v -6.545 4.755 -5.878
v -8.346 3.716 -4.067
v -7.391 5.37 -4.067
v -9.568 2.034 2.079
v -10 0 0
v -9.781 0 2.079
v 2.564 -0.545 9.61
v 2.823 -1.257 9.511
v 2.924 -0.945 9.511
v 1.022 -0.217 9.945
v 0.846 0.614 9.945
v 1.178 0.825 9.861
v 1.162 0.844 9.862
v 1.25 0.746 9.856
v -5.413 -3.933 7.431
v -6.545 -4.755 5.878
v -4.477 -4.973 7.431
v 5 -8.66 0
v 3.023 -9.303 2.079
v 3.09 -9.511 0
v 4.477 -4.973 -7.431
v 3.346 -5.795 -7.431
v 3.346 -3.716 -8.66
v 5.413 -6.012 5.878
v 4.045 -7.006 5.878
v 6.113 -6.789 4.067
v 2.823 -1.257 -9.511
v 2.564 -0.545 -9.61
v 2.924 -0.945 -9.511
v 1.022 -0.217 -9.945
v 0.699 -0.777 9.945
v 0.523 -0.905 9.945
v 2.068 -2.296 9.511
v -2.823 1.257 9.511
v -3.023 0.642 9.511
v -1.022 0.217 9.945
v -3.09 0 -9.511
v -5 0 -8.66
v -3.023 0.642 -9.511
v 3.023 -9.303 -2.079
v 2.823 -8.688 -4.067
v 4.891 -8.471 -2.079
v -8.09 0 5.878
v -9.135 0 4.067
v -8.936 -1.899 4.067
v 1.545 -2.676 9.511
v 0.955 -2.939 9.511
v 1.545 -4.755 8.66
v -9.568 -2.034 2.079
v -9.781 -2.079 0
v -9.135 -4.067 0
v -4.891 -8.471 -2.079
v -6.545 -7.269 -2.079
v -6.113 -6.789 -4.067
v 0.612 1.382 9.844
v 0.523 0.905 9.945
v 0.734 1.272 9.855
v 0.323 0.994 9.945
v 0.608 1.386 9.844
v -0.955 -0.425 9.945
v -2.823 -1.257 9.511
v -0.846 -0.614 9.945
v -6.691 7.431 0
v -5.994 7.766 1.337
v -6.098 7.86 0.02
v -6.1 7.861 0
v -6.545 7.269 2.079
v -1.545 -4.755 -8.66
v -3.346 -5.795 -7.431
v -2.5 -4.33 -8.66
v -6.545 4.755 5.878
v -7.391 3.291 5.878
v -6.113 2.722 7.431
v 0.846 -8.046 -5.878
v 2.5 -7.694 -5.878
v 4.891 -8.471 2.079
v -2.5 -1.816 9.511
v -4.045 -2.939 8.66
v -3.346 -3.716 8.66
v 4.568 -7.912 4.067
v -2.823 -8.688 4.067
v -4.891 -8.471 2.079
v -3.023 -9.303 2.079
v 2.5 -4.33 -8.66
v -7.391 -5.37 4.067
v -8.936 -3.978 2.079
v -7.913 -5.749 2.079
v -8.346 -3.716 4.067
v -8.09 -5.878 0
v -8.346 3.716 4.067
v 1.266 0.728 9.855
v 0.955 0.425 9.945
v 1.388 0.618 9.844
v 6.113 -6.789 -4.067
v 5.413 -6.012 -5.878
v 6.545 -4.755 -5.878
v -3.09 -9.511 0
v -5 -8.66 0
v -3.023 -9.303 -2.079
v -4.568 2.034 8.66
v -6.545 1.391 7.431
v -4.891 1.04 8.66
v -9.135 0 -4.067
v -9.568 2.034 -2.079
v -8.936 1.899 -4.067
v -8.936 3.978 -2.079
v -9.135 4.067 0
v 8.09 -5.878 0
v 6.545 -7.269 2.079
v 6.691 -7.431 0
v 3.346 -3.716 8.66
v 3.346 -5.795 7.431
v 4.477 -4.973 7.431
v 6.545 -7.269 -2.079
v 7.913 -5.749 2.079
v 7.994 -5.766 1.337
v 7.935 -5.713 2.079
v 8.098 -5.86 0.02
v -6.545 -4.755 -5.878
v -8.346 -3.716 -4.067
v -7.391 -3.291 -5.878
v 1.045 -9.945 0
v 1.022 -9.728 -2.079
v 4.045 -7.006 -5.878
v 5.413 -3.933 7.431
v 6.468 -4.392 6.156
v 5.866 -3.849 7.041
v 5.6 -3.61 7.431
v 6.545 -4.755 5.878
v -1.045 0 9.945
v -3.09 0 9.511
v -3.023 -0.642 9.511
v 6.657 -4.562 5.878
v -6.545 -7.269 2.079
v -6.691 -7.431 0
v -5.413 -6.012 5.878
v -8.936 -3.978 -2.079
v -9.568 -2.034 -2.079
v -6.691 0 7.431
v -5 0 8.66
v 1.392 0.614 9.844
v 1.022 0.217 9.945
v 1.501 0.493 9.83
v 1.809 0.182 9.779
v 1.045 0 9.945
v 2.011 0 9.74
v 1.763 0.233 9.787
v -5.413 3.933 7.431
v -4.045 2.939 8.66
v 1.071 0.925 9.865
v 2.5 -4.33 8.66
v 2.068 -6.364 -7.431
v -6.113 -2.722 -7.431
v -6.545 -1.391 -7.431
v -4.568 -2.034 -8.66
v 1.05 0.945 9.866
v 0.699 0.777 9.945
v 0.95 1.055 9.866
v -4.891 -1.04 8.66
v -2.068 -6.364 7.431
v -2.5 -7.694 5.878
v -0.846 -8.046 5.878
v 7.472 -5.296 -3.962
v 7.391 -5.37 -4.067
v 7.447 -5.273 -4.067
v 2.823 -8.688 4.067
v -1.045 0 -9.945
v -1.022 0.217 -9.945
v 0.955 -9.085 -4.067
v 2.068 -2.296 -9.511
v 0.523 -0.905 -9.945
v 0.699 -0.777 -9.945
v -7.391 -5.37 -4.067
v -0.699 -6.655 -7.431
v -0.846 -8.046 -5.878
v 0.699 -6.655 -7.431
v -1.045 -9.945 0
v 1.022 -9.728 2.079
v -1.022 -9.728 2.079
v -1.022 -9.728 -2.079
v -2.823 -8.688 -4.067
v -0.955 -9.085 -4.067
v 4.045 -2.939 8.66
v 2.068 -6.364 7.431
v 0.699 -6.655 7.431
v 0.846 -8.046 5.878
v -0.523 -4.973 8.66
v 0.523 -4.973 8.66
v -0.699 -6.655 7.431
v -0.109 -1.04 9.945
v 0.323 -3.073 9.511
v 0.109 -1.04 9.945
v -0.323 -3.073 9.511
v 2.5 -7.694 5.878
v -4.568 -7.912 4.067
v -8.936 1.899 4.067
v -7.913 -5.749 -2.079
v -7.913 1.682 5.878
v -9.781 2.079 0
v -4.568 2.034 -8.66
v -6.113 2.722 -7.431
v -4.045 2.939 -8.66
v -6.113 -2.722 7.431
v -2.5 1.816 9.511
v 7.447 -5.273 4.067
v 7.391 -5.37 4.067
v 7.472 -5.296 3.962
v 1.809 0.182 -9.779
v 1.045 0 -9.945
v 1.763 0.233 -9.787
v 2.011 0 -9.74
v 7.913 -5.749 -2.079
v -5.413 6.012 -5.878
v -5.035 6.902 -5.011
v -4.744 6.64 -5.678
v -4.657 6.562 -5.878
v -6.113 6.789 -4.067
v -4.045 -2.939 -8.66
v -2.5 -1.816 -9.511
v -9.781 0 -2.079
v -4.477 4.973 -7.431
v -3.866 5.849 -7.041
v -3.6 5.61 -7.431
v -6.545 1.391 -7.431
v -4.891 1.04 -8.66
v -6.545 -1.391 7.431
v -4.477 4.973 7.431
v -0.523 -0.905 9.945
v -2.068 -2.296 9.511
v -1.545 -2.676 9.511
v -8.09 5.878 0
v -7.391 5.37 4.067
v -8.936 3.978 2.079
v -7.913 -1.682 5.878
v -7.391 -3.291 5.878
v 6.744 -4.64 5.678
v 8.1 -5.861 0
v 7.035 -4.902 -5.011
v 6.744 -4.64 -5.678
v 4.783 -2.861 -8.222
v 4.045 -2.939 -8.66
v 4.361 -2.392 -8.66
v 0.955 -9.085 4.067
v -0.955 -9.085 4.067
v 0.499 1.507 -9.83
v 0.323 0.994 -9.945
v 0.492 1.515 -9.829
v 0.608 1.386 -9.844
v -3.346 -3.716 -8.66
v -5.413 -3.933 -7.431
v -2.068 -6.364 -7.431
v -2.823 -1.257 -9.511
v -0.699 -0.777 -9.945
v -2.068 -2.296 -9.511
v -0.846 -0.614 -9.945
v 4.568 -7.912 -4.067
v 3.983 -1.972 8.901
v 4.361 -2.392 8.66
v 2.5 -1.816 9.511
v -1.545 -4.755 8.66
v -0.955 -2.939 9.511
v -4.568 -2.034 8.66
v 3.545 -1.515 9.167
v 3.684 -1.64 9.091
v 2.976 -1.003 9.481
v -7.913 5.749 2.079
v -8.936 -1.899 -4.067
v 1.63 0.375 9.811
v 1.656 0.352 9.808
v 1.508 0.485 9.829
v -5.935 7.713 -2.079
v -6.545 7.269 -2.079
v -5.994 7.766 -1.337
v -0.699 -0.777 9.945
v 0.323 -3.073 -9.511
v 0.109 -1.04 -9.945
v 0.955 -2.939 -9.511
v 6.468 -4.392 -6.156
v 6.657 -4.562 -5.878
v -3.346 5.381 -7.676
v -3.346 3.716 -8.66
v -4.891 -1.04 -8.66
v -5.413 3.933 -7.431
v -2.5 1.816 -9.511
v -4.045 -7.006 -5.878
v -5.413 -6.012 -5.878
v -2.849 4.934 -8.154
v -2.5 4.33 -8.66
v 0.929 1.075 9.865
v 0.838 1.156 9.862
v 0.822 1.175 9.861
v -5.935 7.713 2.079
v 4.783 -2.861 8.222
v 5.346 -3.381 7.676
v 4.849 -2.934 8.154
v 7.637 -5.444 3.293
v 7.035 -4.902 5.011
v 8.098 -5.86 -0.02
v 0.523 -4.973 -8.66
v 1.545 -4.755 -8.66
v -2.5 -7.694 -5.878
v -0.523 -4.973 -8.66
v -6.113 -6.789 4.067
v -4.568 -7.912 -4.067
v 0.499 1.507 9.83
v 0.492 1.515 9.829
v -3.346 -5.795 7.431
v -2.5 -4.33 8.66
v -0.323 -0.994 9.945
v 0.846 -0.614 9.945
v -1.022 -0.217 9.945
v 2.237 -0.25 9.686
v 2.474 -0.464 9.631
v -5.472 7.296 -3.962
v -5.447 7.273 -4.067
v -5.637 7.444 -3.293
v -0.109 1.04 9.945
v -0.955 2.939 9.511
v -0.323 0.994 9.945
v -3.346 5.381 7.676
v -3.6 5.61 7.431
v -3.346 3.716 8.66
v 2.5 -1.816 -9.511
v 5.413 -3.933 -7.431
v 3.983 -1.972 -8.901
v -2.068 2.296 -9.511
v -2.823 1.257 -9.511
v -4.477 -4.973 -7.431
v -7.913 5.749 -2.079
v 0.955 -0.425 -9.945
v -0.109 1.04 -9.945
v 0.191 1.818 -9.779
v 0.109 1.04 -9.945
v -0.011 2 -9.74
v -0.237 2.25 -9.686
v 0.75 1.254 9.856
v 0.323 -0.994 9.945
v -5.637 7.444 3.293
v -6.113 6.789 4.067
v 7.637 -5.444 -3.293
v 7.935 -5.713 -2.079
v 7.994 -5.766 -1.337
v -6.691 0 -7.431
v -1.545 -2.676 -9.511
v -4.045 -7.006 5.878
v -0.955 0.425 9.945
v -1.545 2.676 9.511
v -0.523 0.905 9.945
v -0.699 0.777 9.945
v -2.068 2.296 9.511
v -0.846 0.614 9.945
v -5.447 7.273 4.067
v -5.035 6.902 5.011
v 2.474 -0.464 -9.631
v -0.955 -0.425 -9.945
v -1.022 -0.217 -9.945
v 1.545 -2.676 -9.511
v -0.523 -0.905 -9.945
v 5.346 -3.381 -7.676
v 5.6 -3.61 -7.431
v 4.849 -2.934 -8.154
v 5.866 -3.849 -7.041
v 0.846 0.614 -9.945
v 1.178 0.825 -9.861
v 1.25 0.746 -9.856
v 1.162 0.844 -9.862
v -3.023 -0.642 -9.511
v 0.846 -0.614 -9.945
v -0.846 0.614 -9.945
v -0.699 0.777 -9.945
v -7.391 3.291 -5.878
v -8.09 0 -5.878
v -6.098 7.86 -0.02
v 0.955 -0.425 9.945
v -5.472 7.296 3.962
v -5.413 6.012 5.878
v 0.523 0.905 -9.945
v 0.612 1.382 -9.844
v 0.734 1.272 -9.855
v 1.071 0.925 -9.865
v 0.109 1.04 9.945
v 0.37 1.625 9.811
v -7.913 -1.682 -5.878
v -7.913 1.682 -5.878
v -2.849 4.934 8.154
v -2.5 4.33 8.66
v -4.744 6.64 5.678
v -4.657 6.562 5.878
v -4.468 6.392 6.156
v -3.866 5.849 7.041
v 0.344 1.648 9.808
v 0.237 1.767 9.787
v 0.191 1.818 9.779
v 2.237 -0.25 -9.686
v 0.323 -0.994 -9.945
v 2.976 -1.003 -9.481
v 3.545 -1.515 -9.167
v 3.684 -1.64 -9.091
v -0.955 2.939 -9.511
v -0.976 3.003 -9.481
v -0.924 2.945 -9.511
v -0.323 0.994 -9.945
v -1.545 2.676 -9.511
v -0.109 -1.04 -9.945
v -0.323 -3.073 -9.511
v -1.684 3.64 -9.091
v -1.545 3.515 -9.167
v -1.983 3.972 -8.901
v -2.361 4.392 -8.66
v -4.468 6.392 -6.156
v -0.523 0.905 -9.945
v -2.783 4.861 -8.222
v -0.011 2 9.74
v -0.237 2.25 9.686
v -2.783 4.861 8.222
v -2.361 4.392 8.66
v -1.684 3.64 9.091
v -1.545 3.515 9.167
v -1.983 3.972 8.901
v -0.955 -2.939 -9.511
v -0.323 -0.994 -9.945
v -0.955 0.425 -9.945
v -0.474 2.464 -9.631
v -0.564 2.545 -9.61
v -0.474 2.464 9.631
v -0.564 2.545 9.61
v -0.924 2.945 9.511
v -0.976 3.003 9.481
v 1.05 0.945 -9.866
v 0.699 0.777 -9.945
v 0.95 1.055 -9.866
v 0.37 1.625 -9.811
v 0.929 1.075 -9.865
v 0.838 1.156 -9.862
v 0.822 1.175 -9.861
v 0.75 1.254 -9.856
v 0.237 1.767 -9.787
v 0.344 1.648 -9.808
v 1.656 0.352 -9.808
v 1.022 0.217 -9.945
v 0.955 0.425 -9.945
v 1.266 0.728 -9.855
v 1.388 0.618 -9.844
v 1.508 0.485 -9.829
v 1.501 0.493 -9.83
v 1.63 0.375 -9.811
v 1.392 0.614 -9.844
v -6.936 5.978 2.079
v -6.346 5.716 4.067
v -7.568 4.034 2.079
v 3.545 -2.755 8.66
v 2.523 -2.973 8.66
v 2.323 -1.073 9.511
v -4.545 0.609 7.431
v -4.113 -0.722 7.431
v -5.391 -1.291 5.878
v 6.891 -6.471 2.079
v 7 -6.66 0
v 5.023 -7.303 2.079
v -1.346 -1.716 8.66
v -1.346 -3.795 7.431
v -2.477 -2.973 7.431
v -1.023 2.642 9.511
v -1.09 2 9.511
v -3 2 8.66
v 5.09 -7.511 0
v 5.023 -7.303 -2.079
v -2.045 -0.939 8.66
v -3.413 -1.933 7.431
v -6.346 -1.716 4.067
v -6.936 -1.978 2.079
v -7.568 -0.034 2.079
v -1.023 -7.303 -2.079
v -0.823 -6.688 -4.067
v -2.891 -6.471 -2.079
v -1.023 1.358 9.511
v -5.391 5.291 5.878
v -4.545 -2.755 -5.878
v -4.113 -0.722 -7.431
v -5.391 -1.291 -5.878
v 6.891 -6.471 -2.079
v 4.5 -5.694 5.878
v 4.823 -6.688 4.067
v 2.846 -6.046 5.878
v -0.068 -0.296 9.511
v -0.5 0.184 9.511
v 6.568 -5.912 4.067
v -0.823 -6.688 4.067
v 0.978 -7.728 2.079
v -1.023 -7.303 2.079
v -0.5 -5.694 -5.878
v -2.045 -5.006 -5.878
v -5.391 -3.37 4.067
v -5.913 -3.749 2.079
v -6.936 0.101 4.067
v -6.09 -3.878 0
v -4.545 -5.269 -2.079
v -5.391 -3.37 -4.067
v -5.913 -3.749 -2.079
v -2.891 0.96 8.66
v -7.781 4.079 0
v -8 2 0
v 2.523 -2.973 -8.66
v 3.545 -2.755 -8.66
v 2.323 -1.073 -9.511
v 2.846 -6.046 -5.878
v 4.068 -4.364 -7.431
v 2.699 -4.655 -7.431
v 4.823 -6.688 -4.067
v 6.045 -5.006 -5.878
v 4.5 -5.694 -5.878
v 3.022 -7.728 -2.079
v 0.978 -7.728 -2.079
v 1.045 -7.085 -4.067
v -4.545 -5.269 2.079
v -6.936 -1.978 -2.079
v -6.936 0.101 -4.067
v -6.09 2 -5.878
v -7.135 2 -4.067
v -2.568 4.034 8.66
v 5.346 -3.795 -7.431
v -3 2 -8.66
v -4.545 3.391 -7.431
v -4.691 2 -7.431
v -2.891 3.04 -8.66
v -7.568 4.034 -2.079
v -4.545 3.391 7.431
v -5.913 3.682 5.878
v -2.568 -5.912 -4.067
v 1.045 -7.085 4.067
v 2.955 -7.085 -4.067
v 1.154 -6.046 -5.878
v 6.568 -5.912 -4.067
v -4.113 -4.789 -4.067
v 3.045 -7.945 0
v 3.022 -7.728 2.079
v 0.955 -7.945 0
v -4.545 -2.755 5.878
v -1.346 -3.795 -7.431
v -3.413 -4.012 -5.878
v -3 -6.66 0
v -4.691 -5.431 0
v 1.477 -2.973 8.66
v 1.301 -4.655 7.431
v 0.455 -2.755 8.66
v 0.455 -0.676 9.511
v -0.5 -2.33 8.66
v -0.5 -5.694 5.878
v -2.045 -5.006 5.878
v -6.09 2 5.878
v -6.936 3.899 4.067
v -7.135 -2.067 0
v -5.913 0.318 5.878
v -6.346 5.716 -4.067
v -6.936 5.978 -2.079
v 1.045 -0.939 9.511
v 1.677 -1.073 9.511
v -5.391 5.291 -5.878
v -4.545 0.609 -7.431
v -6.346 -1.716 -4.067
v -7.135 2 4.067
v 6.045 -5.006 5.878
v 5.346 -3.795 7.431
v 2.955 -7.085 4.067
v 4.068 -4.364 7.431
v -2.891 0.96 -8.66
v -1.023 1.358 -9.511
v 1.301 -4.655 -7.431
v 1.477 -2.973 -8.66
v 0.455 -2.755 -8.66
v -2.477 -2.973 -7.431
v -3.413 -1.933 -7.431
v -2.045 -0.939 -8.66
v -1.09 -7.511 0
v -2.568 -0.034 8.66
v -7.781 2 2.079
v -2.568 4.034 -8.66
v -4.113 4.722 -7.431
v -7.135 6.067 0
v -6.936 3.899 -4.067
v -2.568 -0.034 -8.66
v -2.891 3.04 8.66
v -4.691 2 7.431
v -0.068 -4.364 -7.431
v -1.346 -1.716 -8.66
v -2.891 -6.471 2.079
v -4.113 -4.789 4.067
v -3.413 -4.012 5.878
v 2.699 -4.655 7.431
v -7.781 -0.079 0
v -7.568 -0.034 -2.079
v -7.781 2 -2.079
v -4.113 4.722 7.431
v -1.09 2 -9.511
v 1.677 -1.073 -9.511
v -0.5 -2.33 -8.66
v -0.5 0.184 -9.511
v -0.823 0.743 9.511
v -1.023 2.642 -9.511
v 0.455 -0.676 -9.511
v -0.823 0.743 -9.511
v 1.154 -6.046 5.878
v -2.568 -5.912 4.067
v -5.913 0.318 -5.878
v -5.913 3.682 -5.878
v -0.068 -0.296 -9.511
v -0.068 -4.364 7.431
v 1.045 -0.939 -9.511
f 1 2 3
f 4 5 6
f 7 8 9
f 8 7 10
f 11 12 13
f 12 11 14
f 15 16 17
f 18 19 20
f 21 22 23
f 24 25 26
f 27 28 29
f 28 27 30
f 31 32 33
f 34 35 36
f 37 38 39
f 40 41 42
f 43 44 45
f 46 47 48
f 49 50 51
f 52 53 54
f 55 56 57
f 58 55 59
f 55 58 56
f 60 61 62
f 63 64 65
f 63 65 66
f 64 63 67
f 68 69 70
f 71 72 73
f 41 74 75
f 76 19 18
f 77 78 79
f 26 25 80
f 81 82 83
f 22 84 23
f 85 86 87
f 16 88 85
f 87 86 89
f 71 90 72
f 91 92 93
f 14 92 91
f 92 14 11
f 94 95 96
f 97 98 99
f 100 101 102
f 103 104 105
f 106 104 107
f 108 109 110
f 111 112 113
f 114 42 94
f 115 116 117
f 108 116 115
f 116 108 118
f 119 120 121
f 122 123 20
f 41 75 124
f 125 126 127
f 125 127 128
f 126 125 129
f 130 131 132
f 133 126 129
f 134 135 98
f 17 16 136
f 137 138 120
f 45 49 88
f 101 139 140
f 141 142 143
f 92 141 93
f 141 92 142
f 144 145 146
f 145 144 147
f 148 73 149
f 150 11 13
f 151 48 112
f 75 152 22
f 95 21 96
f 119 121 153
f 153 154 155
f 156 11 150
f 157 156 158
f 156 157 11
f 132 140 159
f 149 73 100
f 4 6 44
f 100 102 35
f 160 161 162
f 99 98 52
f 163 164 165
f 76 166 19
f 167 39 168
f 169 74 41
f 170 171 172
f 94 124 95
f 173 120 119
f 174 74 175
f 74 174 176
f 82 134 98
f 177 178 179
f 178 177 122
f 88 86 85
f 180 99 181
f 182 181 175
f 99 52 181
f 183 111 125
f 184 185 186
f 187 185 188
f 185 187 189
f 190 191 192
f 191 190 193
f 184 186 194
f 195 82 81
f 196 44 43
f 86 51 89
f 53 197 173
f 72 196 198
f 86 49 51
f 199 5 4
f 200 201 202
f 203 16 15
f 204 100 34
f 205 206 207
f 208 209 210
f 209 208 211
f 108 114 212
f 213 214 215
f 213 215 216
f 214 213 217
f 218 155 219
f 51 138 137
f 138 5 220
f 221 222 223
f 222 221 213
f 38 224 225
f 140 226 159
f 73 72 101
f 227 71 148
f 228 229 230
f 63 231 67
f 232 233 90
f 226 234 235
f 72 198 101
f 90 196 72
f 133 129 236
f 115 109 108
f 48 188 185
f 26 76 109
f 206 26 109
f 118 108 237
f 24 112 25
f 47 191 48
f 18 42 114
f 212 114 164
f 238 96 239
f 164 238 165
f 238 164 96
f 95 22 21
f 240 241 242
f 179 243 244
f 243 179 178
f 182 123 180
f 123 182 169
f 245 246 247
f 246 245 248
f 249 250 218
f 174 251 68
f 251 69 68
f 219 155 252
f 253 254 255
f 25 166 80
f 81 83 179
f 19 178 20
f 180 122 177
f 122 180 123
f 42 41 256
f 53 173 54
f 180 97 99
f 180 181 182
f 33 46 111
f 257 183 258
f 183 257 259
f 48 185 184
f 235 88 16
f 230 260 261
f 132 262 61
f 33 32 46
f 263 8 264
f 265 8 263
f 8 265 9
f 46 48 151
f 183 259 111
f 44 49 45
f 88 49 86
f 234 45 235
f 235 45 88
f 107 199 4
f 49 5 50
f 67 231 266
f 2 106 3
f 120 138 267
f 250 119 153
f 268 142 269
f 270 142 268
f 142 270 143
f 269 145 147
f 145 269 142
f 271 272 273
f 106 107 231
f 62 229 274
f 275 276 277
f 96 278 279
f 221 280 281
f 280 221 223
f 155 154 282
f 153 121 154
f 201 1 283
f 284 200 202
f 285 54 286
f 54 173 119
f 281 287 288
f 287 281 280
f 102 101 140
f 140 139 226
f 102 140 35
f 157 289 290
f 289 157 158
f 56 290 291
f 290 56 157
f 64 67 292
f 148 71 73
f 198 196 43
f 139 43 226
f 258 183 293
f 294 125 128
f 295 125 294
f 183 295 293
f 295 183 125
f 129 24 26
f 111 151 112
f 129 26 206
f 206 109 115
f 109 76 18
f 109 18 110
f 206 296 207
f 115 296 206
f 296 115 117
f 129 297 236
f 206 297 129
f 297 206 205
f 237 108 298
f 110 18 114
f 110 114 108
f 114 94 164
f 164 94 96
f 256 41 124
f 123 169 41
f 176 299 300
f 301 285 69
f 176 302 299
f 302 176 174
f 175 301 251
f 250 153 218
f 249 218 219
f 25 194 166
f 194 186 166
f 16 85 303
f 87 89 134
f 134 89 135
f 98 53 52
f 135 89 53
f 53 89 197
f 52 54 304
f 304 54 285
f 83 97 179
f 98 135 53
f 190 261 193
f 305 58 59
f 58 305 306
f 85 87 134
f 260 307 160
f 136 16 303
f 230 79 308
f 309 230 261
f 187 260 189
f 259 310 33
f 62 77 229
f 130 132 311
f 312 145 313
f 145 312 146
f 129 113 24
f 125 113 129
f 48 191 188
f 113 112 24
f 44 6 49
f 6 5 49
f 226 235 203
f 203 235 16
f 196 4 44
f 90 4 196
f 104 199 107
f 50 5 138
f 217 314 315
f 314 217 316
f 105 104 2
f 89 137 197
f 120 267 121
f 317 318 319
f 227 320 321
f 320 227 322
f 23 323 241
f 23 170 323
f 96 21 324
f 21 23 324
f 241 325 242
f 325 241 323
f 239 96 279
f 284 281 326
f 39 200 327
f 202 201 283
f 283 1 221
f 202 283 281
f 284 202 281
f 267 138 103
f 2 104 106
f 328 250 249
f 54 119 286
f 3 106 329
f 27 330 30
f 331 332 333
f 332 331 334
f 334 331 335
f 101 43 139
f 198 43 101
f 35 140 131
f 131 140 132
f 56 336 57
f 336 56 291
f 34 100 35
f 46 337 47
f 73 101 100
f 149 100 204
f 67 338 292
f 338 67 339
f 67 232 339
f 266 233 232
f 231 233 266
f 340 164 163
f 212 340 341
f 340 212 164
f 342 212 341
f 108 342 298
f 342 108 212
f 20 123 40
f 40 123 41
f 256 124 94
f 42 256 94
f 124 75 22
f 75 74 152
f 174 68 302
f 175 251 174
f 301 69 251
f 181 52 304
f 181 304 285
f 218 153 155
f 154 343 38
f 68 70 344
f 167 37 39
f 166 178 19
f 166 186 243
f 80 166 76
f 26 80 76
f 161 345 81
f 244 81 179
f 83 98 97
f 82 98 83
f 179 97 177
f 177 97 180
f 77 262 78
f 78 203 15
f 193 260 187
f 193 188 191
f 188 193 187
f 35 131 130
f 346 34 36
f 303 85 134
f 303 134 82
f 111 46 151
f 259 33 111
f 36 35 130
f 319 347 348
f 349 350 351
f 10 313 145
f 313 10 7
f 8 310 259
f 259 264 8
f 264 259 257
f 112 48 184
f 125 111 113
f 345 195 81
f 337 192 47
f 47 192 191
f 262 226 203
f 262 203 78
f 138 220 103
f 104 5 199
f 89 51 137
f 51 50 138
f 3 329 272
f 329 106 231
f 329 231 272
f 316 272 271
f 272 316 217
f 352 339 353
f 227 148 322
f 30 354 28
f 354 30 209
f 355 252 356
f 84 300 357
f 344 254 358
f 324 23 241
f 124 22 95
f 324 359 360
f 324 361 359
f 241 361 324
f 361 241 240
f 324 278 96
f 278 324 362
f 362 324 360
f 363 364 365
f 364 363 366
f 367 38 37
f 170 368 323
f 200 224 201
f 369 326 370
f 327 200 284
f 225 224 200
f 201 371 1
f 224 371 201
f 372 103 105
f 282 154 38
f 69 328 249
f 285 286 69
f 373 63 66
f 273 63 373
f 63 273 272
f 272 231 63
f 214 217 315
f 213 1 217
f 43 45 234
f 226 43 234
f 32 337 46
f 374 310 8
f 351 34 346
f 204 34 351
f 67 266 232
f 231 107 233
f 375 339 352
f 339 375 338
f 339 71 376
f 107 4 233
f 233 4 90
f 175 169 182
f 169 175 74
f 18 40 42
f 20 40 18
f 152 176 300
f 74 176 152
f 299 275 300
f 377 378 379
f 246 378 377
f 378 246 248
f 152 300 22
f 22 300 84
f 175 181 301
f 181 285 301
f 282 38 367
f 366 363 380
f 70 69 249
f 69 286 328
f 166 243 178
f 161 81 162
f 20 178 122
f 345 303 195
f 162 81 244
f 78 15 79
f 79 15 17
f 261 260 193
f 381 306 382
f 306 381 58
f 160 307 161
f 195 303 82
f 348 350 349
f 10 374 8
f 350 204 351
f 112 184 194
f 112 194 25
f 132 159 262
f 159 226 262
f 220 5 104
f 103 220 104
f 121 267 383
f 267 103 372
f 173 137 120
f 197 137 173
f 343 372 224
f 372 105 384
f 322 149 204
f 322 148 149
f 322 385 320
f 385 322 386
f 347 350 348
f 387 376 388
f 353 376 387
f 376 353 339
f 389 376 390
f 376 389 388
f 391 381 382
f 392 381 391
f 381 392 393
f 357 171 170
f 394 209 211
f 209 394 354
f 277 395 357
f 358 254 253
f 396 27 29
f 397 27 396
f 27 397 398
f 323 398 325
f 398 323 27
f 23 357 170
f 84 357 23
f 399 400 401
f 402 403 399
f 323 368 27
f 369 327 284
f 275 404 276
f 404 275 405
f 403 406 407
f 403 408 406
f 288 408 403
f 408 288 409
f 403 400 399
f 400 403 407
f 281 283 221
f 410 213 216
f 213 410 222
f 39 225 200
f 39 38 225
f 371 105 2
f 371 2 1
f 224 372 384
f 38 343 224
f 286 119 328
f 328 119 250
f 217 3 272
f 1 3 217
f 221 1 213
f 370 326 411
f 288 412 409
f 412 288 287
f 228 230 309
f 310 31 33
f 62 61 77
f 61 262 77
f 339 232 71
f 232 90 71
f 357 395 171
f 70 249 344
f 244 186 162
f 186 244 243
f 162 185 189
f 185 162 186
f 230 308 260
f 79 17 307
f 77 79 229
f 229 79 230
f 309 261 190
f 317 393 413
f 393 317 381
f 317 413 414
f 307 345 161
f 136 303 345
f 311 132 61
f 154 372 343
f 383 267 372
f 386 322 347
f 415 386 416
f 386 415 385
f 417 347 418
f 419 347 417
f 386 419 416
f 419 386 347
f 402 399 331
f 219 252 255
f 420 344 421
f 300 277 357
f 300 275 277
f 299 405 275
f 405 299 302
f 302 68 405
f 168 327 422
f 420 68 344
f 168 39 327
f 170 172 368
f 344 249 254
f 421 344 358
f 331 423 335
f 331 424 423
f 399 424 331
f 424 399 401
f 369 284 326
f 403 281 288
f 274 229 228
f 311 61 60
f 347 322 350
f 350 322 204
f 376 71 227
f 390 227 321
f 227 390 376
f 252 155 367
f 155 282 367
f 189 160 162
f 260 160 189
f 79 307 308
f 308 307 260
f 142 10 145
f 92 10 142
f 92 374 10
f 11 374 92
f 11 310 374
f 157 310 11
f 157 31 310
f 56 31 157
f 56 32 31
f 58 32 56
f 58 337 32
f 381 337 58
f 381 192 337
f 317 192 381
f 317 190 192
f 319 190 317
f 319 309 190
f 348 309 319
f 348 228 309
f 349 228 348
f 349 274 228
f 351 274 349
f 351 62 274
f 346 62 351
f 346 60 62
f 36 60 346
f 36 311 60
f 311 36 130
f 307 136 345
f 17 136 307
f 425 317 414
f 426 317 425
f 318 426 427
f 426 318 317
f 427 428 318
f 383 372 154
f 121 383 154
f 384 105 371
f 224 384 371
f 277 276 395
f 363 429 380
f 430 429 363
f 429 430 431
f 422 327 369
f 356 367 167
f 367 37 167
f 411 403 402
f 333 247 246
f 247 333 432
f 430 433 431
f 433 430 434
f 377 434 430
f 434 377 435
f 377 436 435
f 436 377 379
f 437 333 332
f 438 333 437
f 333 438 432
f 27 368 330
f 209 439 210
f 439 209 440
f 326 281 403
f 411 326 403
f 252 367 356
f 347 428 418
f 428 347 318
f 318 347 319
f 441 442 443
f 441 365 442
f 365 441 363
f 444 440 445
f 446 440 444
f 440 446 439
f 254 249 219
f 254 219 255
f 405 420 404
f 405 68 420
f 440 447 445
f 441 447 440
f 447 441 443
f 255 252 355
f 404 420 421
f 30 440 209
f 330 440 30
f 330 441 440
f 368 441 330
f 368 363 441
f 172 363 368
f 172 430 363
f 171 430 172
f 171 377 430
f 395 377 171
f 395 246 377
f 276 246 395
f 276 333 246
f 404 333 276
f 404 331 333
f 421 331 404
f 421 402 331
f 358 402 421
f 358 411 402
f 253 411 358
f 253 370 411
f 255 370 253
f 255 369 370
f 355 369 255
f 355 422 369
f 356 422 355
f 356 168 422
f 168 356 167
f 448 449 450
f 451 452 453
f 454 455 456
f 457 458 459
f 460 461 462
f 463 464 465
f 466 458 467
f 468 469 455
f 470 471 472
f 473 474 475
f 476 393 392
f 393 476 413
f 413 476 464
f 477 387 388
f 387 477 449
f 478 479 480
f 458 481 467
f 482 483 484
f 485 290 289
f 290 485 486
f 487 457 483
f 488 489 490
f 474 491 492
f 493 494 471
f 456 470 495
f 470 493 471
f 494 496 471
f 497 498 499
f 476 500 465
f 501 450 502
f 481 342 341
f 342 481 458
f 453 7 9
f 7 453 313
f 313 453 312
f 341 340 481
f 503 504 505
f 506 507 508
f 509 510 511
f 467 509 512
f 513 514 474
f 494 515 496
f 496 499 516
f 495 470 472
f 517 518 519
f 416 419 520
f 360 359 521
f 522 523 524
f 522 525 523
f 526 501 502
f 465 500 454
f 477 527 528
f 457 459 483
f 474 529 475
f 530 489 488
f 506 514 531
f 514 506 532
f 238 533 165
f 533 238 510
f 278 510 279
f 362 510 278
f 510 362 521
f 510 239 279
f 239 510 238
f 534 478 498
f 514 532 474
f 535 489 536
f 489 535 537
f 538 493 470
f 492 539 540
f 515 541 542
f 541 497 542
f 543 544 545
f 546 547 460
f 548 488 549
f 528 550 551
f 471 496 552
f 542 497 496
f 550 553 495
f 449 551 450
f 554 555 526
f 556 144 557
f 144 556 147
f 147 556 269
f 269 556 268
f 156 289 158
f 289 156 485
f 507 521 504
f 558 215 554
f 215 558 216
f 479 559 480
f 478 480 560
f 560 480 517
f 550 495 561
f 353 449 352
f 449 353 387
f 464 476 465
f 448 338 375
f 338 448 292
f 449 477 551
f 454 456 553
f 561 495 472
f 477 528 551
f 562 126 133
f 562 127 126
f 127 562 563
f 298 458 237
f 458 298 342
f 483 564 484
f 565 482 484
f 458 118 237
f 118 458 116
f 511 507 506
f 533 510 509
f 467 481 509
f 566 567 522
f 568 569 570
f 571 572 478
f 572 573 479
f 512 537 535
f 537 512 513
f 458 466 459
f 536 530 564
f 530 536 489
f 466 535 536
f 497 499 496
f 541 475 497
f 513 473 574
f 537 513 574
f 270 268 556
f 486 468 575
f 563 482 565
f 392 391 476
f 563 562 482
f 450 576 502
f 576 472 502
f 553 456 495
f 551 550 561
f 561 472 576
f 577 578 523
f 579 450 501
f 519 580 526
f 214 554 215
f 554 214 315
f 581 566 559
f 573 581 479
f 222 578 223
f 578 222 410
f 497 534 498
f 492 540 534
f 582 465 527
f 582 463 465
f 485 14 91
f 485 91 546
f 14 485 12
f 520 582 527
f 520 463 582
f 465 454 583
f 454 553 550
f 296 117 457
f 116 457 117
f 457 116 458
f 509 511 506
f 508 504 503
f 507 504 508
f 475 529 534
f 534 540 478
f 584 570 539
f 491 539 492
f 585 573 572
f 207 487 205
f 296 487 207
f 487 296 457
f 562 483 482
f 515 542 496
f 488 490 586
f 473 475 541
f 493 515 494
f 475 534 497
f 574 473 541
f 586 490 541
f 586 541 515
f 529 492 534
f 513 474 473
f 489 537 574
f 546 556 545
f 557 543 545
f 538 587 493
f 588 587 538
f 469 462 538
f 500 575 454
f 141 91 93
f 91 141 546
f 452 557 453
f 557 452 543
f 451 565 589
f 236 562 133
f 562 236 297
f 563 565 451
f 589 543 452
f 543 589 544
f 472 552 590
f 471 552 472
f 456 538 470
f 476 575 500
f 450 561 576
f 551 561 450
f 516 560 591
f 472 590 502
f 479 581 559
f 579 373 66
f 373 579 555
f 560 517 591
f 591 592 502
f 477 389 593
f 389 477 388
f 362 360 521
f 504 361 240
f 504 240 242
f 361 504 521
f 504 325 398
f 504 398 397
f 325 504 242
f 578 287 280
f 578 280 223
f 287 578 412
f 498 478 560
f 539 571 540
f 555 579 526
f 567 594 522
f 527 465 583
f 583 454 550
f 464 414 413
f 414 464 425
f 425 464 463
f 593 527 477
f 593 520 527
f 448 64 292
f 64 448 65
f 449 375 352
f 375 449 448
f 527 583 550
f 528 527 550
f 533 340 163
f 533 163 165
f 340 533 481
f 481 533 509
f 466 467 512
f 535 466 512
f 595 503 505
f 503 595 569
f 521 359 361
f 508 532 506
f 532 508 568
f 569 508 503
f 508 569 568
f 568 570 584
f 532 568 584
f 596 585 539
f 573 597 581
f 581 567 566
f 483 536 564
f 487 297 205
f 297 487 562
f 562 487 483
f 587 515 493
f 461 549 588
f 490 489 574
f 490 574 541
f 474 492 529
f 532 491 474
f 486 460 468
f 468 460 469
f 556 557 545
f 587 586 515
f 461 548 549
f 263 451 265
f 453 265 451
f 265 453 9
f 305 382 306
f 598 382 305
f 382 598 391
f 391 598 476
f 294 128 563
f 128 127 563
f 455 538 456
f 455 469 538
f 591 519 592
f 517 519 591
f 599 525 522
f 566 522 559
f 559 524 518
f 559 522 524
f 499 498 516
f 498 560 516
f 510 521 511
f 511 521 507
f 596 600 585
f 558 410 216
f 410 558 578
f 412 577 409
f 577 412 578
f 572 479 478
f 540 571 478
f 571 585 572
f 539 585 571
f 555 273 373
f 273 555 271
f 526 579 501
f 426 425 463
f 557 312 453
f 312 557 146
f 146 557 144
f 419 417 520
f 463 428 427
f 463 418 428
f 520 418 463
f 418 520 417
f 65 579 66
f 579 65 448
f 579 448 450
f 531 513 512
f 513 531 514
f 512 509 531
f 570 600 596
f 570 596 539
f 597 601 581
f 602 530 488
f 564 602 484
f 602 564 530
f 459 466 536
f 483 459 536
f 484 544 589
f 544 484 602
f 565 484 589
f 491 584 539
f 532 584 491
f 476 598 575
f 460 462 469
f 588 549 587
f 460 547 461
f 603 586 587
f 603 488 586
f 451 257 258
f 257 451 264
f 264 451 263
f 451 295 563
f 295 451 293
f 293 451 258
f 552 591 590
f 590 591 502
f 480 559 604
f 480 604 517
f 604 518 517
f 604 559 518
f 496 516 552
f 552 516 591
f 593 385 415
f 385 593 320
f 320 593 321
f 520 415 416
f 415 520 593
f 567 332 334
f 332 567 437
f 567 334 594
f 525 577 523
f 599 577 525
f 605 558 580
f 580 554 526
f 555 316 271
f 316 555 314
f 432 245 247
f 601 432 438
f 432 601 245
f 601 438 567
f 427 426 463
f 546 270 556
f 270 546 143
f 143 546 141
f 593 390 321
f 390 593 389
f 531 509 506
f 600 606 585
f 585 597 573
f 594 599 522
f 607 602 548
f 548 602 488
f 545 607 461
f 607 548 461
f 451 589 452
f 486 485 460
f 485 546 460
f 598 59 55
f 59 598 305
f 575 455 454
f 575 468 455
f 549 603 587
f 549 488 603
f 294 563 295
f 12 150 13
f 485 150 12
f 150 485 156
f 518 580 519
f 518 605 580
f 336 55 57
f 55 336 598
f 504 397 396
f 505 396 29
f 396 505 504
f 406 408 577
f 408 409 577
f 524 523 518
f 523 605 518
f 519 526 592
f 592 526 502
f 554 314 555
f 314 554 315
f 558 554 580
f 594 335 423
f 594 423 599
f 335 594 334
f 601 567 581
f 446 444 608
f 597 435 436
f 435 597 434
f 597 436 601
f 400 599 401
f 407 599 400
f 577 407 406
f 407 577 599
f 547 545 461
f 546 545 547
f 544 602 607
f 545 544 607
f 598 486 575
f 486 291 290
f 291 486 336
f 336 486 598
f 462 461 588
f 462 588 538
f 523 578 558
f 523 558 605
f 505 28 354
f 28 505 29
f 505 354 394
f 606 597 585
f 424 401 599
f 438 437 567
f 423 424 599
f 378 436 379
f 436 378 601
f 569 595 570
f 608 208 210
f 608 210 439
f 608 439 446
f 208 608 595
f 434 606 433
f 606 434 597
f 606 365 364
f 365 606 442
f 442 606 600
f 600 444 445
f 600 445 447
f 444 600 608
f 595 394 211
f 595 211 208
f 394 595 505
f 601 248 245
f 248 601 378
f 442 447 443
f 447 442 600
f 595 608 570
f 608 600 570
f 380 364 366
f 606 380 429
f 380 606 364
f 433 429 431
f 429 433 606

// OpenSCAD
//
//  Copyright (C) 29-09-2013 Jasper den Ouden.(ojasper.nl)
//
//  This is free software: you can redistribute it and/or modify
//  it under the terms of the GNU General Public License as published
//  by the Free Software Foundation, either version 3 of the License, or
//  (at your option) any later version.
//

R=10;
t= 2;

difference()
{   sphere(R);
    translate([t,t]) sphere(R);
}
